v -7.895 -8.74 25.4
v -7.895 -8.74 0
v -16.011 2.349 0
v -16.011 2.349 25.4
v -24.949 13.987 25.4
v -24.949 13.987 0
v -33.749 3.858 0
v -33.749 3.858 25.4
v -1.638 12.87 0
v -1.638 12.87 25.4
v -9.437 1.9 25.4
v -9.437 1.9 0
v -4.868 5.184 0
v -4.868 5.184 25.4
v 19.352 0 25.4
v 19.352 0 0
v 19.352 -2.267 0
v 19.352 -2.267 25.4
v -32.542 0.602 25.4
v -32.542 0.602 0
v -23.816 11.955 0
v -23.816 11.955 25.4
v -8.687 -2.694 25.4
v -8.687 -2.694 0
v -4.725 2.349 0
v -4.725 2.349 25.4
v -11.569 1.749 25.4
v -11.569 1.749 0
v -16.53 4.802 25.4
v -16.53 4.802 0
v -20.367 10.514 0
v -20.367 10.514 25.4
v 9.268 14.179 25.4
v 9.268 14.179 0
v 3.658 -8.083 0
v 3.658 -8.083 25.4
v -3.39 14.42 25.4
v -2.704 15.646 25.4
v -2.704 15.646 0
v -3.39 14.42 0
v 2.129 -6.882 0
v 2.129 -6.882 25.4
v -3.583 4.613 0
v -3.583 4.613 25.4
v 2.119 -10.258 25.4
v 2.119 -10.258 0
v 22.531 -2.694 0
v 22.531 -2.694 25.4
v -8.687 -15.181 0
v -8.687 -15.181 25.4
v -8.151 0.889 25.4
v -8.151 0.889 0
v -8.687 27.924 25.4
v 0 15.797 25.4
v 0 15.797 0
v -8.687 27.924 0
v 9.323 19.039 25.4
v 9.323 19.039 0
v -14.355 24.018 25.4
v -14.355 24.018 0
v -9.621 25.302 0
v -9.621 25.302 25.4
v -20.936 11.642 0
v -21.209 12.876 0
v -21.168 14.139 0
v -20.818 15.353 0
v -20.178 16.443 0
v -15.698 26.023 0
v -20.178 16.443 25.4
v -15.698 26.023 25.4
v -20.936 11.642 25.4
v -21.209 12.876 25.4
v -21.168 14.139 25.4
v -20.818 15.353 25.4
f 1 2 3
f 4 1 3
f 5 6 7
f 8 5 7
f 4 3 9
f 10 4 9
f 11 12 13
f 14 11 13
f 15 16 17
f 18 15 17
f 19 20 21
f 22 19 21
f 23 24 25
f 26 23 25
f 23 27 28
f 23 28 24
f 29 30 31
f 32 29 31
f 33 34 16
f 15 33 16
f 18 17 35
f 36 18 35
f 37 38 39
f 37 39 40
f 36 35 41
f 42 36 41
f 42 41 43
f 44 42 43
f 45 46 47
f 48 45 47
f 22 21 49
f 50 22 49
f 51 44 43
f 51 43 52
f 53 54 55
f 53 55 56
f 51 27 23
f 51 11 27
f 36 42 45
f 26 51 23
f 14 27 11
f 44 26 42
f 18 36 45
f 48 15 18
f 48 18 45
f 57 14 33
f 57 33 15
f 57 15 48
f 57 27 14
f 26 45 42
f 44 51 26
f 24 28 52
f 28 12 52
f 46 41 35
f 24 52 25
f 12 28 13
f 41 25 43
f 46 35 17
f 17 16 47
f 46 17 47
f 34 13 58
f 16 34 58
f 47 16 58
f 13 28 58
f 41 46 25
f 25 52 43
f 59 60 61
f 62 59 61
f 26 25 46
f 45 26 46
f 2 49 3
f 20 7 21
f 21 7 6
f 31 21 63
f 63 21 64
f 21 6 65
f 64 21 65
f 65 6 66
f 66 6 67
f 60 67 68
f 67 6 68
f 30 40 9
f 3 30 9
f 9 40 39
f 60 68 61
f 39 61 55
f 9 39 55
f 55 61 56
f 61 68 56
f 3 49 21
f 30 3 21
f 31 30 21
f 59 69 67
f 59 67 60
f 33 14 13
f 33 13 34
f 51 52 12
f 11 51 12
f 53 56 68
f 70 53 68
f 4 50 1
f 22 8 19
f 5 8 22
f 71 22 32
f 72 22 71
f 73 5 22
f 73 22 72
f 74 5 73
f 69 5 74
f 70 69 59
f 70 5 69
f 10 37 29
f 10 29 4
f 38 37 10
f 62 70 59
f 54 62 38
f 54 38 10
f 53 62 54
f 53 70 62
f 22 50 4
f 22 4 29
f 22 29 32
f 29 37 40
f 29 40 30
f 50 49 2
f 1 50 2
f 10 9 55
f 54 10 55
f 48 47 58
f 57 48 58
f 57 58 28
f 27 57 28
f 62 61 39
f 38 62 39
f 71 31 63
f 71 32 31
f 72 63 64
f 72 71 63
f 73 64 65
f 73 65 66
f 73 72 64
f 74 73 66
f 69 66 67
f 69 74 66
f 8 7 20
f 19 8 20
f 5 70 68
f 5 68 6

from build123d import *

# Parameters (mm, degrees)
F1_DEPTH = 25.4
F2_R     = 5.08


with BuildPart() as f1:
    # F0 (on Top) → F1 (new body)
    with BuildSketch(Plane.XY):
        Polygon((-8.687248, -15.180712), (-7.894566, -8.740172), (-16.011428, 2.349292), (-1.63827, 12.869632), (0, 15.796965), (-8.687248, 27.923886), (-15.697712, 26.022742), (-24.948966, 13.987131), (-33.748982, 3.858465), (-32.542204, 0.602082), (-23.815881, 11.954773), align=None)
        Polygon((-22.40441, 13.546446), (-14.355188, 24.018249), (-9.621114, 25.302067), (-2.704024, 15.64619), (-3.390064, 14.420344), (-16.530498, 4.802288), align=None, mode=Mode.SUBTRACT)
        Polygon((9.323029, 19.038815), (-11.568893, 1.748949), (-8.687248, -2.693586), (-4.724987, 2.349292), (2.118919, -10.257903), (22.530565, -2.693586), align=None)
        Polygon((3.657808, -8.083027), (2.128598, -6.881505), (-3.582856, 4.612795), (-8.150667, 0.88909), (-9.437095, 1.899855), (-4.867933, 5.18394), (9.267915, 14.17948), (19.351967, 0), (19.351967, -2.266956), align=None, mode=Mode.SUBTRACT)
    extrude(amount=F1_DEPTH)

    # F2
    f2_edges = [f1.edges().sort_by_distance(p)[0] for p in [
        (-22.40441, 13.546446, 12.7),
    ]]
    fillet(f2_edges, radius=F2_R)


solid = f1.part
